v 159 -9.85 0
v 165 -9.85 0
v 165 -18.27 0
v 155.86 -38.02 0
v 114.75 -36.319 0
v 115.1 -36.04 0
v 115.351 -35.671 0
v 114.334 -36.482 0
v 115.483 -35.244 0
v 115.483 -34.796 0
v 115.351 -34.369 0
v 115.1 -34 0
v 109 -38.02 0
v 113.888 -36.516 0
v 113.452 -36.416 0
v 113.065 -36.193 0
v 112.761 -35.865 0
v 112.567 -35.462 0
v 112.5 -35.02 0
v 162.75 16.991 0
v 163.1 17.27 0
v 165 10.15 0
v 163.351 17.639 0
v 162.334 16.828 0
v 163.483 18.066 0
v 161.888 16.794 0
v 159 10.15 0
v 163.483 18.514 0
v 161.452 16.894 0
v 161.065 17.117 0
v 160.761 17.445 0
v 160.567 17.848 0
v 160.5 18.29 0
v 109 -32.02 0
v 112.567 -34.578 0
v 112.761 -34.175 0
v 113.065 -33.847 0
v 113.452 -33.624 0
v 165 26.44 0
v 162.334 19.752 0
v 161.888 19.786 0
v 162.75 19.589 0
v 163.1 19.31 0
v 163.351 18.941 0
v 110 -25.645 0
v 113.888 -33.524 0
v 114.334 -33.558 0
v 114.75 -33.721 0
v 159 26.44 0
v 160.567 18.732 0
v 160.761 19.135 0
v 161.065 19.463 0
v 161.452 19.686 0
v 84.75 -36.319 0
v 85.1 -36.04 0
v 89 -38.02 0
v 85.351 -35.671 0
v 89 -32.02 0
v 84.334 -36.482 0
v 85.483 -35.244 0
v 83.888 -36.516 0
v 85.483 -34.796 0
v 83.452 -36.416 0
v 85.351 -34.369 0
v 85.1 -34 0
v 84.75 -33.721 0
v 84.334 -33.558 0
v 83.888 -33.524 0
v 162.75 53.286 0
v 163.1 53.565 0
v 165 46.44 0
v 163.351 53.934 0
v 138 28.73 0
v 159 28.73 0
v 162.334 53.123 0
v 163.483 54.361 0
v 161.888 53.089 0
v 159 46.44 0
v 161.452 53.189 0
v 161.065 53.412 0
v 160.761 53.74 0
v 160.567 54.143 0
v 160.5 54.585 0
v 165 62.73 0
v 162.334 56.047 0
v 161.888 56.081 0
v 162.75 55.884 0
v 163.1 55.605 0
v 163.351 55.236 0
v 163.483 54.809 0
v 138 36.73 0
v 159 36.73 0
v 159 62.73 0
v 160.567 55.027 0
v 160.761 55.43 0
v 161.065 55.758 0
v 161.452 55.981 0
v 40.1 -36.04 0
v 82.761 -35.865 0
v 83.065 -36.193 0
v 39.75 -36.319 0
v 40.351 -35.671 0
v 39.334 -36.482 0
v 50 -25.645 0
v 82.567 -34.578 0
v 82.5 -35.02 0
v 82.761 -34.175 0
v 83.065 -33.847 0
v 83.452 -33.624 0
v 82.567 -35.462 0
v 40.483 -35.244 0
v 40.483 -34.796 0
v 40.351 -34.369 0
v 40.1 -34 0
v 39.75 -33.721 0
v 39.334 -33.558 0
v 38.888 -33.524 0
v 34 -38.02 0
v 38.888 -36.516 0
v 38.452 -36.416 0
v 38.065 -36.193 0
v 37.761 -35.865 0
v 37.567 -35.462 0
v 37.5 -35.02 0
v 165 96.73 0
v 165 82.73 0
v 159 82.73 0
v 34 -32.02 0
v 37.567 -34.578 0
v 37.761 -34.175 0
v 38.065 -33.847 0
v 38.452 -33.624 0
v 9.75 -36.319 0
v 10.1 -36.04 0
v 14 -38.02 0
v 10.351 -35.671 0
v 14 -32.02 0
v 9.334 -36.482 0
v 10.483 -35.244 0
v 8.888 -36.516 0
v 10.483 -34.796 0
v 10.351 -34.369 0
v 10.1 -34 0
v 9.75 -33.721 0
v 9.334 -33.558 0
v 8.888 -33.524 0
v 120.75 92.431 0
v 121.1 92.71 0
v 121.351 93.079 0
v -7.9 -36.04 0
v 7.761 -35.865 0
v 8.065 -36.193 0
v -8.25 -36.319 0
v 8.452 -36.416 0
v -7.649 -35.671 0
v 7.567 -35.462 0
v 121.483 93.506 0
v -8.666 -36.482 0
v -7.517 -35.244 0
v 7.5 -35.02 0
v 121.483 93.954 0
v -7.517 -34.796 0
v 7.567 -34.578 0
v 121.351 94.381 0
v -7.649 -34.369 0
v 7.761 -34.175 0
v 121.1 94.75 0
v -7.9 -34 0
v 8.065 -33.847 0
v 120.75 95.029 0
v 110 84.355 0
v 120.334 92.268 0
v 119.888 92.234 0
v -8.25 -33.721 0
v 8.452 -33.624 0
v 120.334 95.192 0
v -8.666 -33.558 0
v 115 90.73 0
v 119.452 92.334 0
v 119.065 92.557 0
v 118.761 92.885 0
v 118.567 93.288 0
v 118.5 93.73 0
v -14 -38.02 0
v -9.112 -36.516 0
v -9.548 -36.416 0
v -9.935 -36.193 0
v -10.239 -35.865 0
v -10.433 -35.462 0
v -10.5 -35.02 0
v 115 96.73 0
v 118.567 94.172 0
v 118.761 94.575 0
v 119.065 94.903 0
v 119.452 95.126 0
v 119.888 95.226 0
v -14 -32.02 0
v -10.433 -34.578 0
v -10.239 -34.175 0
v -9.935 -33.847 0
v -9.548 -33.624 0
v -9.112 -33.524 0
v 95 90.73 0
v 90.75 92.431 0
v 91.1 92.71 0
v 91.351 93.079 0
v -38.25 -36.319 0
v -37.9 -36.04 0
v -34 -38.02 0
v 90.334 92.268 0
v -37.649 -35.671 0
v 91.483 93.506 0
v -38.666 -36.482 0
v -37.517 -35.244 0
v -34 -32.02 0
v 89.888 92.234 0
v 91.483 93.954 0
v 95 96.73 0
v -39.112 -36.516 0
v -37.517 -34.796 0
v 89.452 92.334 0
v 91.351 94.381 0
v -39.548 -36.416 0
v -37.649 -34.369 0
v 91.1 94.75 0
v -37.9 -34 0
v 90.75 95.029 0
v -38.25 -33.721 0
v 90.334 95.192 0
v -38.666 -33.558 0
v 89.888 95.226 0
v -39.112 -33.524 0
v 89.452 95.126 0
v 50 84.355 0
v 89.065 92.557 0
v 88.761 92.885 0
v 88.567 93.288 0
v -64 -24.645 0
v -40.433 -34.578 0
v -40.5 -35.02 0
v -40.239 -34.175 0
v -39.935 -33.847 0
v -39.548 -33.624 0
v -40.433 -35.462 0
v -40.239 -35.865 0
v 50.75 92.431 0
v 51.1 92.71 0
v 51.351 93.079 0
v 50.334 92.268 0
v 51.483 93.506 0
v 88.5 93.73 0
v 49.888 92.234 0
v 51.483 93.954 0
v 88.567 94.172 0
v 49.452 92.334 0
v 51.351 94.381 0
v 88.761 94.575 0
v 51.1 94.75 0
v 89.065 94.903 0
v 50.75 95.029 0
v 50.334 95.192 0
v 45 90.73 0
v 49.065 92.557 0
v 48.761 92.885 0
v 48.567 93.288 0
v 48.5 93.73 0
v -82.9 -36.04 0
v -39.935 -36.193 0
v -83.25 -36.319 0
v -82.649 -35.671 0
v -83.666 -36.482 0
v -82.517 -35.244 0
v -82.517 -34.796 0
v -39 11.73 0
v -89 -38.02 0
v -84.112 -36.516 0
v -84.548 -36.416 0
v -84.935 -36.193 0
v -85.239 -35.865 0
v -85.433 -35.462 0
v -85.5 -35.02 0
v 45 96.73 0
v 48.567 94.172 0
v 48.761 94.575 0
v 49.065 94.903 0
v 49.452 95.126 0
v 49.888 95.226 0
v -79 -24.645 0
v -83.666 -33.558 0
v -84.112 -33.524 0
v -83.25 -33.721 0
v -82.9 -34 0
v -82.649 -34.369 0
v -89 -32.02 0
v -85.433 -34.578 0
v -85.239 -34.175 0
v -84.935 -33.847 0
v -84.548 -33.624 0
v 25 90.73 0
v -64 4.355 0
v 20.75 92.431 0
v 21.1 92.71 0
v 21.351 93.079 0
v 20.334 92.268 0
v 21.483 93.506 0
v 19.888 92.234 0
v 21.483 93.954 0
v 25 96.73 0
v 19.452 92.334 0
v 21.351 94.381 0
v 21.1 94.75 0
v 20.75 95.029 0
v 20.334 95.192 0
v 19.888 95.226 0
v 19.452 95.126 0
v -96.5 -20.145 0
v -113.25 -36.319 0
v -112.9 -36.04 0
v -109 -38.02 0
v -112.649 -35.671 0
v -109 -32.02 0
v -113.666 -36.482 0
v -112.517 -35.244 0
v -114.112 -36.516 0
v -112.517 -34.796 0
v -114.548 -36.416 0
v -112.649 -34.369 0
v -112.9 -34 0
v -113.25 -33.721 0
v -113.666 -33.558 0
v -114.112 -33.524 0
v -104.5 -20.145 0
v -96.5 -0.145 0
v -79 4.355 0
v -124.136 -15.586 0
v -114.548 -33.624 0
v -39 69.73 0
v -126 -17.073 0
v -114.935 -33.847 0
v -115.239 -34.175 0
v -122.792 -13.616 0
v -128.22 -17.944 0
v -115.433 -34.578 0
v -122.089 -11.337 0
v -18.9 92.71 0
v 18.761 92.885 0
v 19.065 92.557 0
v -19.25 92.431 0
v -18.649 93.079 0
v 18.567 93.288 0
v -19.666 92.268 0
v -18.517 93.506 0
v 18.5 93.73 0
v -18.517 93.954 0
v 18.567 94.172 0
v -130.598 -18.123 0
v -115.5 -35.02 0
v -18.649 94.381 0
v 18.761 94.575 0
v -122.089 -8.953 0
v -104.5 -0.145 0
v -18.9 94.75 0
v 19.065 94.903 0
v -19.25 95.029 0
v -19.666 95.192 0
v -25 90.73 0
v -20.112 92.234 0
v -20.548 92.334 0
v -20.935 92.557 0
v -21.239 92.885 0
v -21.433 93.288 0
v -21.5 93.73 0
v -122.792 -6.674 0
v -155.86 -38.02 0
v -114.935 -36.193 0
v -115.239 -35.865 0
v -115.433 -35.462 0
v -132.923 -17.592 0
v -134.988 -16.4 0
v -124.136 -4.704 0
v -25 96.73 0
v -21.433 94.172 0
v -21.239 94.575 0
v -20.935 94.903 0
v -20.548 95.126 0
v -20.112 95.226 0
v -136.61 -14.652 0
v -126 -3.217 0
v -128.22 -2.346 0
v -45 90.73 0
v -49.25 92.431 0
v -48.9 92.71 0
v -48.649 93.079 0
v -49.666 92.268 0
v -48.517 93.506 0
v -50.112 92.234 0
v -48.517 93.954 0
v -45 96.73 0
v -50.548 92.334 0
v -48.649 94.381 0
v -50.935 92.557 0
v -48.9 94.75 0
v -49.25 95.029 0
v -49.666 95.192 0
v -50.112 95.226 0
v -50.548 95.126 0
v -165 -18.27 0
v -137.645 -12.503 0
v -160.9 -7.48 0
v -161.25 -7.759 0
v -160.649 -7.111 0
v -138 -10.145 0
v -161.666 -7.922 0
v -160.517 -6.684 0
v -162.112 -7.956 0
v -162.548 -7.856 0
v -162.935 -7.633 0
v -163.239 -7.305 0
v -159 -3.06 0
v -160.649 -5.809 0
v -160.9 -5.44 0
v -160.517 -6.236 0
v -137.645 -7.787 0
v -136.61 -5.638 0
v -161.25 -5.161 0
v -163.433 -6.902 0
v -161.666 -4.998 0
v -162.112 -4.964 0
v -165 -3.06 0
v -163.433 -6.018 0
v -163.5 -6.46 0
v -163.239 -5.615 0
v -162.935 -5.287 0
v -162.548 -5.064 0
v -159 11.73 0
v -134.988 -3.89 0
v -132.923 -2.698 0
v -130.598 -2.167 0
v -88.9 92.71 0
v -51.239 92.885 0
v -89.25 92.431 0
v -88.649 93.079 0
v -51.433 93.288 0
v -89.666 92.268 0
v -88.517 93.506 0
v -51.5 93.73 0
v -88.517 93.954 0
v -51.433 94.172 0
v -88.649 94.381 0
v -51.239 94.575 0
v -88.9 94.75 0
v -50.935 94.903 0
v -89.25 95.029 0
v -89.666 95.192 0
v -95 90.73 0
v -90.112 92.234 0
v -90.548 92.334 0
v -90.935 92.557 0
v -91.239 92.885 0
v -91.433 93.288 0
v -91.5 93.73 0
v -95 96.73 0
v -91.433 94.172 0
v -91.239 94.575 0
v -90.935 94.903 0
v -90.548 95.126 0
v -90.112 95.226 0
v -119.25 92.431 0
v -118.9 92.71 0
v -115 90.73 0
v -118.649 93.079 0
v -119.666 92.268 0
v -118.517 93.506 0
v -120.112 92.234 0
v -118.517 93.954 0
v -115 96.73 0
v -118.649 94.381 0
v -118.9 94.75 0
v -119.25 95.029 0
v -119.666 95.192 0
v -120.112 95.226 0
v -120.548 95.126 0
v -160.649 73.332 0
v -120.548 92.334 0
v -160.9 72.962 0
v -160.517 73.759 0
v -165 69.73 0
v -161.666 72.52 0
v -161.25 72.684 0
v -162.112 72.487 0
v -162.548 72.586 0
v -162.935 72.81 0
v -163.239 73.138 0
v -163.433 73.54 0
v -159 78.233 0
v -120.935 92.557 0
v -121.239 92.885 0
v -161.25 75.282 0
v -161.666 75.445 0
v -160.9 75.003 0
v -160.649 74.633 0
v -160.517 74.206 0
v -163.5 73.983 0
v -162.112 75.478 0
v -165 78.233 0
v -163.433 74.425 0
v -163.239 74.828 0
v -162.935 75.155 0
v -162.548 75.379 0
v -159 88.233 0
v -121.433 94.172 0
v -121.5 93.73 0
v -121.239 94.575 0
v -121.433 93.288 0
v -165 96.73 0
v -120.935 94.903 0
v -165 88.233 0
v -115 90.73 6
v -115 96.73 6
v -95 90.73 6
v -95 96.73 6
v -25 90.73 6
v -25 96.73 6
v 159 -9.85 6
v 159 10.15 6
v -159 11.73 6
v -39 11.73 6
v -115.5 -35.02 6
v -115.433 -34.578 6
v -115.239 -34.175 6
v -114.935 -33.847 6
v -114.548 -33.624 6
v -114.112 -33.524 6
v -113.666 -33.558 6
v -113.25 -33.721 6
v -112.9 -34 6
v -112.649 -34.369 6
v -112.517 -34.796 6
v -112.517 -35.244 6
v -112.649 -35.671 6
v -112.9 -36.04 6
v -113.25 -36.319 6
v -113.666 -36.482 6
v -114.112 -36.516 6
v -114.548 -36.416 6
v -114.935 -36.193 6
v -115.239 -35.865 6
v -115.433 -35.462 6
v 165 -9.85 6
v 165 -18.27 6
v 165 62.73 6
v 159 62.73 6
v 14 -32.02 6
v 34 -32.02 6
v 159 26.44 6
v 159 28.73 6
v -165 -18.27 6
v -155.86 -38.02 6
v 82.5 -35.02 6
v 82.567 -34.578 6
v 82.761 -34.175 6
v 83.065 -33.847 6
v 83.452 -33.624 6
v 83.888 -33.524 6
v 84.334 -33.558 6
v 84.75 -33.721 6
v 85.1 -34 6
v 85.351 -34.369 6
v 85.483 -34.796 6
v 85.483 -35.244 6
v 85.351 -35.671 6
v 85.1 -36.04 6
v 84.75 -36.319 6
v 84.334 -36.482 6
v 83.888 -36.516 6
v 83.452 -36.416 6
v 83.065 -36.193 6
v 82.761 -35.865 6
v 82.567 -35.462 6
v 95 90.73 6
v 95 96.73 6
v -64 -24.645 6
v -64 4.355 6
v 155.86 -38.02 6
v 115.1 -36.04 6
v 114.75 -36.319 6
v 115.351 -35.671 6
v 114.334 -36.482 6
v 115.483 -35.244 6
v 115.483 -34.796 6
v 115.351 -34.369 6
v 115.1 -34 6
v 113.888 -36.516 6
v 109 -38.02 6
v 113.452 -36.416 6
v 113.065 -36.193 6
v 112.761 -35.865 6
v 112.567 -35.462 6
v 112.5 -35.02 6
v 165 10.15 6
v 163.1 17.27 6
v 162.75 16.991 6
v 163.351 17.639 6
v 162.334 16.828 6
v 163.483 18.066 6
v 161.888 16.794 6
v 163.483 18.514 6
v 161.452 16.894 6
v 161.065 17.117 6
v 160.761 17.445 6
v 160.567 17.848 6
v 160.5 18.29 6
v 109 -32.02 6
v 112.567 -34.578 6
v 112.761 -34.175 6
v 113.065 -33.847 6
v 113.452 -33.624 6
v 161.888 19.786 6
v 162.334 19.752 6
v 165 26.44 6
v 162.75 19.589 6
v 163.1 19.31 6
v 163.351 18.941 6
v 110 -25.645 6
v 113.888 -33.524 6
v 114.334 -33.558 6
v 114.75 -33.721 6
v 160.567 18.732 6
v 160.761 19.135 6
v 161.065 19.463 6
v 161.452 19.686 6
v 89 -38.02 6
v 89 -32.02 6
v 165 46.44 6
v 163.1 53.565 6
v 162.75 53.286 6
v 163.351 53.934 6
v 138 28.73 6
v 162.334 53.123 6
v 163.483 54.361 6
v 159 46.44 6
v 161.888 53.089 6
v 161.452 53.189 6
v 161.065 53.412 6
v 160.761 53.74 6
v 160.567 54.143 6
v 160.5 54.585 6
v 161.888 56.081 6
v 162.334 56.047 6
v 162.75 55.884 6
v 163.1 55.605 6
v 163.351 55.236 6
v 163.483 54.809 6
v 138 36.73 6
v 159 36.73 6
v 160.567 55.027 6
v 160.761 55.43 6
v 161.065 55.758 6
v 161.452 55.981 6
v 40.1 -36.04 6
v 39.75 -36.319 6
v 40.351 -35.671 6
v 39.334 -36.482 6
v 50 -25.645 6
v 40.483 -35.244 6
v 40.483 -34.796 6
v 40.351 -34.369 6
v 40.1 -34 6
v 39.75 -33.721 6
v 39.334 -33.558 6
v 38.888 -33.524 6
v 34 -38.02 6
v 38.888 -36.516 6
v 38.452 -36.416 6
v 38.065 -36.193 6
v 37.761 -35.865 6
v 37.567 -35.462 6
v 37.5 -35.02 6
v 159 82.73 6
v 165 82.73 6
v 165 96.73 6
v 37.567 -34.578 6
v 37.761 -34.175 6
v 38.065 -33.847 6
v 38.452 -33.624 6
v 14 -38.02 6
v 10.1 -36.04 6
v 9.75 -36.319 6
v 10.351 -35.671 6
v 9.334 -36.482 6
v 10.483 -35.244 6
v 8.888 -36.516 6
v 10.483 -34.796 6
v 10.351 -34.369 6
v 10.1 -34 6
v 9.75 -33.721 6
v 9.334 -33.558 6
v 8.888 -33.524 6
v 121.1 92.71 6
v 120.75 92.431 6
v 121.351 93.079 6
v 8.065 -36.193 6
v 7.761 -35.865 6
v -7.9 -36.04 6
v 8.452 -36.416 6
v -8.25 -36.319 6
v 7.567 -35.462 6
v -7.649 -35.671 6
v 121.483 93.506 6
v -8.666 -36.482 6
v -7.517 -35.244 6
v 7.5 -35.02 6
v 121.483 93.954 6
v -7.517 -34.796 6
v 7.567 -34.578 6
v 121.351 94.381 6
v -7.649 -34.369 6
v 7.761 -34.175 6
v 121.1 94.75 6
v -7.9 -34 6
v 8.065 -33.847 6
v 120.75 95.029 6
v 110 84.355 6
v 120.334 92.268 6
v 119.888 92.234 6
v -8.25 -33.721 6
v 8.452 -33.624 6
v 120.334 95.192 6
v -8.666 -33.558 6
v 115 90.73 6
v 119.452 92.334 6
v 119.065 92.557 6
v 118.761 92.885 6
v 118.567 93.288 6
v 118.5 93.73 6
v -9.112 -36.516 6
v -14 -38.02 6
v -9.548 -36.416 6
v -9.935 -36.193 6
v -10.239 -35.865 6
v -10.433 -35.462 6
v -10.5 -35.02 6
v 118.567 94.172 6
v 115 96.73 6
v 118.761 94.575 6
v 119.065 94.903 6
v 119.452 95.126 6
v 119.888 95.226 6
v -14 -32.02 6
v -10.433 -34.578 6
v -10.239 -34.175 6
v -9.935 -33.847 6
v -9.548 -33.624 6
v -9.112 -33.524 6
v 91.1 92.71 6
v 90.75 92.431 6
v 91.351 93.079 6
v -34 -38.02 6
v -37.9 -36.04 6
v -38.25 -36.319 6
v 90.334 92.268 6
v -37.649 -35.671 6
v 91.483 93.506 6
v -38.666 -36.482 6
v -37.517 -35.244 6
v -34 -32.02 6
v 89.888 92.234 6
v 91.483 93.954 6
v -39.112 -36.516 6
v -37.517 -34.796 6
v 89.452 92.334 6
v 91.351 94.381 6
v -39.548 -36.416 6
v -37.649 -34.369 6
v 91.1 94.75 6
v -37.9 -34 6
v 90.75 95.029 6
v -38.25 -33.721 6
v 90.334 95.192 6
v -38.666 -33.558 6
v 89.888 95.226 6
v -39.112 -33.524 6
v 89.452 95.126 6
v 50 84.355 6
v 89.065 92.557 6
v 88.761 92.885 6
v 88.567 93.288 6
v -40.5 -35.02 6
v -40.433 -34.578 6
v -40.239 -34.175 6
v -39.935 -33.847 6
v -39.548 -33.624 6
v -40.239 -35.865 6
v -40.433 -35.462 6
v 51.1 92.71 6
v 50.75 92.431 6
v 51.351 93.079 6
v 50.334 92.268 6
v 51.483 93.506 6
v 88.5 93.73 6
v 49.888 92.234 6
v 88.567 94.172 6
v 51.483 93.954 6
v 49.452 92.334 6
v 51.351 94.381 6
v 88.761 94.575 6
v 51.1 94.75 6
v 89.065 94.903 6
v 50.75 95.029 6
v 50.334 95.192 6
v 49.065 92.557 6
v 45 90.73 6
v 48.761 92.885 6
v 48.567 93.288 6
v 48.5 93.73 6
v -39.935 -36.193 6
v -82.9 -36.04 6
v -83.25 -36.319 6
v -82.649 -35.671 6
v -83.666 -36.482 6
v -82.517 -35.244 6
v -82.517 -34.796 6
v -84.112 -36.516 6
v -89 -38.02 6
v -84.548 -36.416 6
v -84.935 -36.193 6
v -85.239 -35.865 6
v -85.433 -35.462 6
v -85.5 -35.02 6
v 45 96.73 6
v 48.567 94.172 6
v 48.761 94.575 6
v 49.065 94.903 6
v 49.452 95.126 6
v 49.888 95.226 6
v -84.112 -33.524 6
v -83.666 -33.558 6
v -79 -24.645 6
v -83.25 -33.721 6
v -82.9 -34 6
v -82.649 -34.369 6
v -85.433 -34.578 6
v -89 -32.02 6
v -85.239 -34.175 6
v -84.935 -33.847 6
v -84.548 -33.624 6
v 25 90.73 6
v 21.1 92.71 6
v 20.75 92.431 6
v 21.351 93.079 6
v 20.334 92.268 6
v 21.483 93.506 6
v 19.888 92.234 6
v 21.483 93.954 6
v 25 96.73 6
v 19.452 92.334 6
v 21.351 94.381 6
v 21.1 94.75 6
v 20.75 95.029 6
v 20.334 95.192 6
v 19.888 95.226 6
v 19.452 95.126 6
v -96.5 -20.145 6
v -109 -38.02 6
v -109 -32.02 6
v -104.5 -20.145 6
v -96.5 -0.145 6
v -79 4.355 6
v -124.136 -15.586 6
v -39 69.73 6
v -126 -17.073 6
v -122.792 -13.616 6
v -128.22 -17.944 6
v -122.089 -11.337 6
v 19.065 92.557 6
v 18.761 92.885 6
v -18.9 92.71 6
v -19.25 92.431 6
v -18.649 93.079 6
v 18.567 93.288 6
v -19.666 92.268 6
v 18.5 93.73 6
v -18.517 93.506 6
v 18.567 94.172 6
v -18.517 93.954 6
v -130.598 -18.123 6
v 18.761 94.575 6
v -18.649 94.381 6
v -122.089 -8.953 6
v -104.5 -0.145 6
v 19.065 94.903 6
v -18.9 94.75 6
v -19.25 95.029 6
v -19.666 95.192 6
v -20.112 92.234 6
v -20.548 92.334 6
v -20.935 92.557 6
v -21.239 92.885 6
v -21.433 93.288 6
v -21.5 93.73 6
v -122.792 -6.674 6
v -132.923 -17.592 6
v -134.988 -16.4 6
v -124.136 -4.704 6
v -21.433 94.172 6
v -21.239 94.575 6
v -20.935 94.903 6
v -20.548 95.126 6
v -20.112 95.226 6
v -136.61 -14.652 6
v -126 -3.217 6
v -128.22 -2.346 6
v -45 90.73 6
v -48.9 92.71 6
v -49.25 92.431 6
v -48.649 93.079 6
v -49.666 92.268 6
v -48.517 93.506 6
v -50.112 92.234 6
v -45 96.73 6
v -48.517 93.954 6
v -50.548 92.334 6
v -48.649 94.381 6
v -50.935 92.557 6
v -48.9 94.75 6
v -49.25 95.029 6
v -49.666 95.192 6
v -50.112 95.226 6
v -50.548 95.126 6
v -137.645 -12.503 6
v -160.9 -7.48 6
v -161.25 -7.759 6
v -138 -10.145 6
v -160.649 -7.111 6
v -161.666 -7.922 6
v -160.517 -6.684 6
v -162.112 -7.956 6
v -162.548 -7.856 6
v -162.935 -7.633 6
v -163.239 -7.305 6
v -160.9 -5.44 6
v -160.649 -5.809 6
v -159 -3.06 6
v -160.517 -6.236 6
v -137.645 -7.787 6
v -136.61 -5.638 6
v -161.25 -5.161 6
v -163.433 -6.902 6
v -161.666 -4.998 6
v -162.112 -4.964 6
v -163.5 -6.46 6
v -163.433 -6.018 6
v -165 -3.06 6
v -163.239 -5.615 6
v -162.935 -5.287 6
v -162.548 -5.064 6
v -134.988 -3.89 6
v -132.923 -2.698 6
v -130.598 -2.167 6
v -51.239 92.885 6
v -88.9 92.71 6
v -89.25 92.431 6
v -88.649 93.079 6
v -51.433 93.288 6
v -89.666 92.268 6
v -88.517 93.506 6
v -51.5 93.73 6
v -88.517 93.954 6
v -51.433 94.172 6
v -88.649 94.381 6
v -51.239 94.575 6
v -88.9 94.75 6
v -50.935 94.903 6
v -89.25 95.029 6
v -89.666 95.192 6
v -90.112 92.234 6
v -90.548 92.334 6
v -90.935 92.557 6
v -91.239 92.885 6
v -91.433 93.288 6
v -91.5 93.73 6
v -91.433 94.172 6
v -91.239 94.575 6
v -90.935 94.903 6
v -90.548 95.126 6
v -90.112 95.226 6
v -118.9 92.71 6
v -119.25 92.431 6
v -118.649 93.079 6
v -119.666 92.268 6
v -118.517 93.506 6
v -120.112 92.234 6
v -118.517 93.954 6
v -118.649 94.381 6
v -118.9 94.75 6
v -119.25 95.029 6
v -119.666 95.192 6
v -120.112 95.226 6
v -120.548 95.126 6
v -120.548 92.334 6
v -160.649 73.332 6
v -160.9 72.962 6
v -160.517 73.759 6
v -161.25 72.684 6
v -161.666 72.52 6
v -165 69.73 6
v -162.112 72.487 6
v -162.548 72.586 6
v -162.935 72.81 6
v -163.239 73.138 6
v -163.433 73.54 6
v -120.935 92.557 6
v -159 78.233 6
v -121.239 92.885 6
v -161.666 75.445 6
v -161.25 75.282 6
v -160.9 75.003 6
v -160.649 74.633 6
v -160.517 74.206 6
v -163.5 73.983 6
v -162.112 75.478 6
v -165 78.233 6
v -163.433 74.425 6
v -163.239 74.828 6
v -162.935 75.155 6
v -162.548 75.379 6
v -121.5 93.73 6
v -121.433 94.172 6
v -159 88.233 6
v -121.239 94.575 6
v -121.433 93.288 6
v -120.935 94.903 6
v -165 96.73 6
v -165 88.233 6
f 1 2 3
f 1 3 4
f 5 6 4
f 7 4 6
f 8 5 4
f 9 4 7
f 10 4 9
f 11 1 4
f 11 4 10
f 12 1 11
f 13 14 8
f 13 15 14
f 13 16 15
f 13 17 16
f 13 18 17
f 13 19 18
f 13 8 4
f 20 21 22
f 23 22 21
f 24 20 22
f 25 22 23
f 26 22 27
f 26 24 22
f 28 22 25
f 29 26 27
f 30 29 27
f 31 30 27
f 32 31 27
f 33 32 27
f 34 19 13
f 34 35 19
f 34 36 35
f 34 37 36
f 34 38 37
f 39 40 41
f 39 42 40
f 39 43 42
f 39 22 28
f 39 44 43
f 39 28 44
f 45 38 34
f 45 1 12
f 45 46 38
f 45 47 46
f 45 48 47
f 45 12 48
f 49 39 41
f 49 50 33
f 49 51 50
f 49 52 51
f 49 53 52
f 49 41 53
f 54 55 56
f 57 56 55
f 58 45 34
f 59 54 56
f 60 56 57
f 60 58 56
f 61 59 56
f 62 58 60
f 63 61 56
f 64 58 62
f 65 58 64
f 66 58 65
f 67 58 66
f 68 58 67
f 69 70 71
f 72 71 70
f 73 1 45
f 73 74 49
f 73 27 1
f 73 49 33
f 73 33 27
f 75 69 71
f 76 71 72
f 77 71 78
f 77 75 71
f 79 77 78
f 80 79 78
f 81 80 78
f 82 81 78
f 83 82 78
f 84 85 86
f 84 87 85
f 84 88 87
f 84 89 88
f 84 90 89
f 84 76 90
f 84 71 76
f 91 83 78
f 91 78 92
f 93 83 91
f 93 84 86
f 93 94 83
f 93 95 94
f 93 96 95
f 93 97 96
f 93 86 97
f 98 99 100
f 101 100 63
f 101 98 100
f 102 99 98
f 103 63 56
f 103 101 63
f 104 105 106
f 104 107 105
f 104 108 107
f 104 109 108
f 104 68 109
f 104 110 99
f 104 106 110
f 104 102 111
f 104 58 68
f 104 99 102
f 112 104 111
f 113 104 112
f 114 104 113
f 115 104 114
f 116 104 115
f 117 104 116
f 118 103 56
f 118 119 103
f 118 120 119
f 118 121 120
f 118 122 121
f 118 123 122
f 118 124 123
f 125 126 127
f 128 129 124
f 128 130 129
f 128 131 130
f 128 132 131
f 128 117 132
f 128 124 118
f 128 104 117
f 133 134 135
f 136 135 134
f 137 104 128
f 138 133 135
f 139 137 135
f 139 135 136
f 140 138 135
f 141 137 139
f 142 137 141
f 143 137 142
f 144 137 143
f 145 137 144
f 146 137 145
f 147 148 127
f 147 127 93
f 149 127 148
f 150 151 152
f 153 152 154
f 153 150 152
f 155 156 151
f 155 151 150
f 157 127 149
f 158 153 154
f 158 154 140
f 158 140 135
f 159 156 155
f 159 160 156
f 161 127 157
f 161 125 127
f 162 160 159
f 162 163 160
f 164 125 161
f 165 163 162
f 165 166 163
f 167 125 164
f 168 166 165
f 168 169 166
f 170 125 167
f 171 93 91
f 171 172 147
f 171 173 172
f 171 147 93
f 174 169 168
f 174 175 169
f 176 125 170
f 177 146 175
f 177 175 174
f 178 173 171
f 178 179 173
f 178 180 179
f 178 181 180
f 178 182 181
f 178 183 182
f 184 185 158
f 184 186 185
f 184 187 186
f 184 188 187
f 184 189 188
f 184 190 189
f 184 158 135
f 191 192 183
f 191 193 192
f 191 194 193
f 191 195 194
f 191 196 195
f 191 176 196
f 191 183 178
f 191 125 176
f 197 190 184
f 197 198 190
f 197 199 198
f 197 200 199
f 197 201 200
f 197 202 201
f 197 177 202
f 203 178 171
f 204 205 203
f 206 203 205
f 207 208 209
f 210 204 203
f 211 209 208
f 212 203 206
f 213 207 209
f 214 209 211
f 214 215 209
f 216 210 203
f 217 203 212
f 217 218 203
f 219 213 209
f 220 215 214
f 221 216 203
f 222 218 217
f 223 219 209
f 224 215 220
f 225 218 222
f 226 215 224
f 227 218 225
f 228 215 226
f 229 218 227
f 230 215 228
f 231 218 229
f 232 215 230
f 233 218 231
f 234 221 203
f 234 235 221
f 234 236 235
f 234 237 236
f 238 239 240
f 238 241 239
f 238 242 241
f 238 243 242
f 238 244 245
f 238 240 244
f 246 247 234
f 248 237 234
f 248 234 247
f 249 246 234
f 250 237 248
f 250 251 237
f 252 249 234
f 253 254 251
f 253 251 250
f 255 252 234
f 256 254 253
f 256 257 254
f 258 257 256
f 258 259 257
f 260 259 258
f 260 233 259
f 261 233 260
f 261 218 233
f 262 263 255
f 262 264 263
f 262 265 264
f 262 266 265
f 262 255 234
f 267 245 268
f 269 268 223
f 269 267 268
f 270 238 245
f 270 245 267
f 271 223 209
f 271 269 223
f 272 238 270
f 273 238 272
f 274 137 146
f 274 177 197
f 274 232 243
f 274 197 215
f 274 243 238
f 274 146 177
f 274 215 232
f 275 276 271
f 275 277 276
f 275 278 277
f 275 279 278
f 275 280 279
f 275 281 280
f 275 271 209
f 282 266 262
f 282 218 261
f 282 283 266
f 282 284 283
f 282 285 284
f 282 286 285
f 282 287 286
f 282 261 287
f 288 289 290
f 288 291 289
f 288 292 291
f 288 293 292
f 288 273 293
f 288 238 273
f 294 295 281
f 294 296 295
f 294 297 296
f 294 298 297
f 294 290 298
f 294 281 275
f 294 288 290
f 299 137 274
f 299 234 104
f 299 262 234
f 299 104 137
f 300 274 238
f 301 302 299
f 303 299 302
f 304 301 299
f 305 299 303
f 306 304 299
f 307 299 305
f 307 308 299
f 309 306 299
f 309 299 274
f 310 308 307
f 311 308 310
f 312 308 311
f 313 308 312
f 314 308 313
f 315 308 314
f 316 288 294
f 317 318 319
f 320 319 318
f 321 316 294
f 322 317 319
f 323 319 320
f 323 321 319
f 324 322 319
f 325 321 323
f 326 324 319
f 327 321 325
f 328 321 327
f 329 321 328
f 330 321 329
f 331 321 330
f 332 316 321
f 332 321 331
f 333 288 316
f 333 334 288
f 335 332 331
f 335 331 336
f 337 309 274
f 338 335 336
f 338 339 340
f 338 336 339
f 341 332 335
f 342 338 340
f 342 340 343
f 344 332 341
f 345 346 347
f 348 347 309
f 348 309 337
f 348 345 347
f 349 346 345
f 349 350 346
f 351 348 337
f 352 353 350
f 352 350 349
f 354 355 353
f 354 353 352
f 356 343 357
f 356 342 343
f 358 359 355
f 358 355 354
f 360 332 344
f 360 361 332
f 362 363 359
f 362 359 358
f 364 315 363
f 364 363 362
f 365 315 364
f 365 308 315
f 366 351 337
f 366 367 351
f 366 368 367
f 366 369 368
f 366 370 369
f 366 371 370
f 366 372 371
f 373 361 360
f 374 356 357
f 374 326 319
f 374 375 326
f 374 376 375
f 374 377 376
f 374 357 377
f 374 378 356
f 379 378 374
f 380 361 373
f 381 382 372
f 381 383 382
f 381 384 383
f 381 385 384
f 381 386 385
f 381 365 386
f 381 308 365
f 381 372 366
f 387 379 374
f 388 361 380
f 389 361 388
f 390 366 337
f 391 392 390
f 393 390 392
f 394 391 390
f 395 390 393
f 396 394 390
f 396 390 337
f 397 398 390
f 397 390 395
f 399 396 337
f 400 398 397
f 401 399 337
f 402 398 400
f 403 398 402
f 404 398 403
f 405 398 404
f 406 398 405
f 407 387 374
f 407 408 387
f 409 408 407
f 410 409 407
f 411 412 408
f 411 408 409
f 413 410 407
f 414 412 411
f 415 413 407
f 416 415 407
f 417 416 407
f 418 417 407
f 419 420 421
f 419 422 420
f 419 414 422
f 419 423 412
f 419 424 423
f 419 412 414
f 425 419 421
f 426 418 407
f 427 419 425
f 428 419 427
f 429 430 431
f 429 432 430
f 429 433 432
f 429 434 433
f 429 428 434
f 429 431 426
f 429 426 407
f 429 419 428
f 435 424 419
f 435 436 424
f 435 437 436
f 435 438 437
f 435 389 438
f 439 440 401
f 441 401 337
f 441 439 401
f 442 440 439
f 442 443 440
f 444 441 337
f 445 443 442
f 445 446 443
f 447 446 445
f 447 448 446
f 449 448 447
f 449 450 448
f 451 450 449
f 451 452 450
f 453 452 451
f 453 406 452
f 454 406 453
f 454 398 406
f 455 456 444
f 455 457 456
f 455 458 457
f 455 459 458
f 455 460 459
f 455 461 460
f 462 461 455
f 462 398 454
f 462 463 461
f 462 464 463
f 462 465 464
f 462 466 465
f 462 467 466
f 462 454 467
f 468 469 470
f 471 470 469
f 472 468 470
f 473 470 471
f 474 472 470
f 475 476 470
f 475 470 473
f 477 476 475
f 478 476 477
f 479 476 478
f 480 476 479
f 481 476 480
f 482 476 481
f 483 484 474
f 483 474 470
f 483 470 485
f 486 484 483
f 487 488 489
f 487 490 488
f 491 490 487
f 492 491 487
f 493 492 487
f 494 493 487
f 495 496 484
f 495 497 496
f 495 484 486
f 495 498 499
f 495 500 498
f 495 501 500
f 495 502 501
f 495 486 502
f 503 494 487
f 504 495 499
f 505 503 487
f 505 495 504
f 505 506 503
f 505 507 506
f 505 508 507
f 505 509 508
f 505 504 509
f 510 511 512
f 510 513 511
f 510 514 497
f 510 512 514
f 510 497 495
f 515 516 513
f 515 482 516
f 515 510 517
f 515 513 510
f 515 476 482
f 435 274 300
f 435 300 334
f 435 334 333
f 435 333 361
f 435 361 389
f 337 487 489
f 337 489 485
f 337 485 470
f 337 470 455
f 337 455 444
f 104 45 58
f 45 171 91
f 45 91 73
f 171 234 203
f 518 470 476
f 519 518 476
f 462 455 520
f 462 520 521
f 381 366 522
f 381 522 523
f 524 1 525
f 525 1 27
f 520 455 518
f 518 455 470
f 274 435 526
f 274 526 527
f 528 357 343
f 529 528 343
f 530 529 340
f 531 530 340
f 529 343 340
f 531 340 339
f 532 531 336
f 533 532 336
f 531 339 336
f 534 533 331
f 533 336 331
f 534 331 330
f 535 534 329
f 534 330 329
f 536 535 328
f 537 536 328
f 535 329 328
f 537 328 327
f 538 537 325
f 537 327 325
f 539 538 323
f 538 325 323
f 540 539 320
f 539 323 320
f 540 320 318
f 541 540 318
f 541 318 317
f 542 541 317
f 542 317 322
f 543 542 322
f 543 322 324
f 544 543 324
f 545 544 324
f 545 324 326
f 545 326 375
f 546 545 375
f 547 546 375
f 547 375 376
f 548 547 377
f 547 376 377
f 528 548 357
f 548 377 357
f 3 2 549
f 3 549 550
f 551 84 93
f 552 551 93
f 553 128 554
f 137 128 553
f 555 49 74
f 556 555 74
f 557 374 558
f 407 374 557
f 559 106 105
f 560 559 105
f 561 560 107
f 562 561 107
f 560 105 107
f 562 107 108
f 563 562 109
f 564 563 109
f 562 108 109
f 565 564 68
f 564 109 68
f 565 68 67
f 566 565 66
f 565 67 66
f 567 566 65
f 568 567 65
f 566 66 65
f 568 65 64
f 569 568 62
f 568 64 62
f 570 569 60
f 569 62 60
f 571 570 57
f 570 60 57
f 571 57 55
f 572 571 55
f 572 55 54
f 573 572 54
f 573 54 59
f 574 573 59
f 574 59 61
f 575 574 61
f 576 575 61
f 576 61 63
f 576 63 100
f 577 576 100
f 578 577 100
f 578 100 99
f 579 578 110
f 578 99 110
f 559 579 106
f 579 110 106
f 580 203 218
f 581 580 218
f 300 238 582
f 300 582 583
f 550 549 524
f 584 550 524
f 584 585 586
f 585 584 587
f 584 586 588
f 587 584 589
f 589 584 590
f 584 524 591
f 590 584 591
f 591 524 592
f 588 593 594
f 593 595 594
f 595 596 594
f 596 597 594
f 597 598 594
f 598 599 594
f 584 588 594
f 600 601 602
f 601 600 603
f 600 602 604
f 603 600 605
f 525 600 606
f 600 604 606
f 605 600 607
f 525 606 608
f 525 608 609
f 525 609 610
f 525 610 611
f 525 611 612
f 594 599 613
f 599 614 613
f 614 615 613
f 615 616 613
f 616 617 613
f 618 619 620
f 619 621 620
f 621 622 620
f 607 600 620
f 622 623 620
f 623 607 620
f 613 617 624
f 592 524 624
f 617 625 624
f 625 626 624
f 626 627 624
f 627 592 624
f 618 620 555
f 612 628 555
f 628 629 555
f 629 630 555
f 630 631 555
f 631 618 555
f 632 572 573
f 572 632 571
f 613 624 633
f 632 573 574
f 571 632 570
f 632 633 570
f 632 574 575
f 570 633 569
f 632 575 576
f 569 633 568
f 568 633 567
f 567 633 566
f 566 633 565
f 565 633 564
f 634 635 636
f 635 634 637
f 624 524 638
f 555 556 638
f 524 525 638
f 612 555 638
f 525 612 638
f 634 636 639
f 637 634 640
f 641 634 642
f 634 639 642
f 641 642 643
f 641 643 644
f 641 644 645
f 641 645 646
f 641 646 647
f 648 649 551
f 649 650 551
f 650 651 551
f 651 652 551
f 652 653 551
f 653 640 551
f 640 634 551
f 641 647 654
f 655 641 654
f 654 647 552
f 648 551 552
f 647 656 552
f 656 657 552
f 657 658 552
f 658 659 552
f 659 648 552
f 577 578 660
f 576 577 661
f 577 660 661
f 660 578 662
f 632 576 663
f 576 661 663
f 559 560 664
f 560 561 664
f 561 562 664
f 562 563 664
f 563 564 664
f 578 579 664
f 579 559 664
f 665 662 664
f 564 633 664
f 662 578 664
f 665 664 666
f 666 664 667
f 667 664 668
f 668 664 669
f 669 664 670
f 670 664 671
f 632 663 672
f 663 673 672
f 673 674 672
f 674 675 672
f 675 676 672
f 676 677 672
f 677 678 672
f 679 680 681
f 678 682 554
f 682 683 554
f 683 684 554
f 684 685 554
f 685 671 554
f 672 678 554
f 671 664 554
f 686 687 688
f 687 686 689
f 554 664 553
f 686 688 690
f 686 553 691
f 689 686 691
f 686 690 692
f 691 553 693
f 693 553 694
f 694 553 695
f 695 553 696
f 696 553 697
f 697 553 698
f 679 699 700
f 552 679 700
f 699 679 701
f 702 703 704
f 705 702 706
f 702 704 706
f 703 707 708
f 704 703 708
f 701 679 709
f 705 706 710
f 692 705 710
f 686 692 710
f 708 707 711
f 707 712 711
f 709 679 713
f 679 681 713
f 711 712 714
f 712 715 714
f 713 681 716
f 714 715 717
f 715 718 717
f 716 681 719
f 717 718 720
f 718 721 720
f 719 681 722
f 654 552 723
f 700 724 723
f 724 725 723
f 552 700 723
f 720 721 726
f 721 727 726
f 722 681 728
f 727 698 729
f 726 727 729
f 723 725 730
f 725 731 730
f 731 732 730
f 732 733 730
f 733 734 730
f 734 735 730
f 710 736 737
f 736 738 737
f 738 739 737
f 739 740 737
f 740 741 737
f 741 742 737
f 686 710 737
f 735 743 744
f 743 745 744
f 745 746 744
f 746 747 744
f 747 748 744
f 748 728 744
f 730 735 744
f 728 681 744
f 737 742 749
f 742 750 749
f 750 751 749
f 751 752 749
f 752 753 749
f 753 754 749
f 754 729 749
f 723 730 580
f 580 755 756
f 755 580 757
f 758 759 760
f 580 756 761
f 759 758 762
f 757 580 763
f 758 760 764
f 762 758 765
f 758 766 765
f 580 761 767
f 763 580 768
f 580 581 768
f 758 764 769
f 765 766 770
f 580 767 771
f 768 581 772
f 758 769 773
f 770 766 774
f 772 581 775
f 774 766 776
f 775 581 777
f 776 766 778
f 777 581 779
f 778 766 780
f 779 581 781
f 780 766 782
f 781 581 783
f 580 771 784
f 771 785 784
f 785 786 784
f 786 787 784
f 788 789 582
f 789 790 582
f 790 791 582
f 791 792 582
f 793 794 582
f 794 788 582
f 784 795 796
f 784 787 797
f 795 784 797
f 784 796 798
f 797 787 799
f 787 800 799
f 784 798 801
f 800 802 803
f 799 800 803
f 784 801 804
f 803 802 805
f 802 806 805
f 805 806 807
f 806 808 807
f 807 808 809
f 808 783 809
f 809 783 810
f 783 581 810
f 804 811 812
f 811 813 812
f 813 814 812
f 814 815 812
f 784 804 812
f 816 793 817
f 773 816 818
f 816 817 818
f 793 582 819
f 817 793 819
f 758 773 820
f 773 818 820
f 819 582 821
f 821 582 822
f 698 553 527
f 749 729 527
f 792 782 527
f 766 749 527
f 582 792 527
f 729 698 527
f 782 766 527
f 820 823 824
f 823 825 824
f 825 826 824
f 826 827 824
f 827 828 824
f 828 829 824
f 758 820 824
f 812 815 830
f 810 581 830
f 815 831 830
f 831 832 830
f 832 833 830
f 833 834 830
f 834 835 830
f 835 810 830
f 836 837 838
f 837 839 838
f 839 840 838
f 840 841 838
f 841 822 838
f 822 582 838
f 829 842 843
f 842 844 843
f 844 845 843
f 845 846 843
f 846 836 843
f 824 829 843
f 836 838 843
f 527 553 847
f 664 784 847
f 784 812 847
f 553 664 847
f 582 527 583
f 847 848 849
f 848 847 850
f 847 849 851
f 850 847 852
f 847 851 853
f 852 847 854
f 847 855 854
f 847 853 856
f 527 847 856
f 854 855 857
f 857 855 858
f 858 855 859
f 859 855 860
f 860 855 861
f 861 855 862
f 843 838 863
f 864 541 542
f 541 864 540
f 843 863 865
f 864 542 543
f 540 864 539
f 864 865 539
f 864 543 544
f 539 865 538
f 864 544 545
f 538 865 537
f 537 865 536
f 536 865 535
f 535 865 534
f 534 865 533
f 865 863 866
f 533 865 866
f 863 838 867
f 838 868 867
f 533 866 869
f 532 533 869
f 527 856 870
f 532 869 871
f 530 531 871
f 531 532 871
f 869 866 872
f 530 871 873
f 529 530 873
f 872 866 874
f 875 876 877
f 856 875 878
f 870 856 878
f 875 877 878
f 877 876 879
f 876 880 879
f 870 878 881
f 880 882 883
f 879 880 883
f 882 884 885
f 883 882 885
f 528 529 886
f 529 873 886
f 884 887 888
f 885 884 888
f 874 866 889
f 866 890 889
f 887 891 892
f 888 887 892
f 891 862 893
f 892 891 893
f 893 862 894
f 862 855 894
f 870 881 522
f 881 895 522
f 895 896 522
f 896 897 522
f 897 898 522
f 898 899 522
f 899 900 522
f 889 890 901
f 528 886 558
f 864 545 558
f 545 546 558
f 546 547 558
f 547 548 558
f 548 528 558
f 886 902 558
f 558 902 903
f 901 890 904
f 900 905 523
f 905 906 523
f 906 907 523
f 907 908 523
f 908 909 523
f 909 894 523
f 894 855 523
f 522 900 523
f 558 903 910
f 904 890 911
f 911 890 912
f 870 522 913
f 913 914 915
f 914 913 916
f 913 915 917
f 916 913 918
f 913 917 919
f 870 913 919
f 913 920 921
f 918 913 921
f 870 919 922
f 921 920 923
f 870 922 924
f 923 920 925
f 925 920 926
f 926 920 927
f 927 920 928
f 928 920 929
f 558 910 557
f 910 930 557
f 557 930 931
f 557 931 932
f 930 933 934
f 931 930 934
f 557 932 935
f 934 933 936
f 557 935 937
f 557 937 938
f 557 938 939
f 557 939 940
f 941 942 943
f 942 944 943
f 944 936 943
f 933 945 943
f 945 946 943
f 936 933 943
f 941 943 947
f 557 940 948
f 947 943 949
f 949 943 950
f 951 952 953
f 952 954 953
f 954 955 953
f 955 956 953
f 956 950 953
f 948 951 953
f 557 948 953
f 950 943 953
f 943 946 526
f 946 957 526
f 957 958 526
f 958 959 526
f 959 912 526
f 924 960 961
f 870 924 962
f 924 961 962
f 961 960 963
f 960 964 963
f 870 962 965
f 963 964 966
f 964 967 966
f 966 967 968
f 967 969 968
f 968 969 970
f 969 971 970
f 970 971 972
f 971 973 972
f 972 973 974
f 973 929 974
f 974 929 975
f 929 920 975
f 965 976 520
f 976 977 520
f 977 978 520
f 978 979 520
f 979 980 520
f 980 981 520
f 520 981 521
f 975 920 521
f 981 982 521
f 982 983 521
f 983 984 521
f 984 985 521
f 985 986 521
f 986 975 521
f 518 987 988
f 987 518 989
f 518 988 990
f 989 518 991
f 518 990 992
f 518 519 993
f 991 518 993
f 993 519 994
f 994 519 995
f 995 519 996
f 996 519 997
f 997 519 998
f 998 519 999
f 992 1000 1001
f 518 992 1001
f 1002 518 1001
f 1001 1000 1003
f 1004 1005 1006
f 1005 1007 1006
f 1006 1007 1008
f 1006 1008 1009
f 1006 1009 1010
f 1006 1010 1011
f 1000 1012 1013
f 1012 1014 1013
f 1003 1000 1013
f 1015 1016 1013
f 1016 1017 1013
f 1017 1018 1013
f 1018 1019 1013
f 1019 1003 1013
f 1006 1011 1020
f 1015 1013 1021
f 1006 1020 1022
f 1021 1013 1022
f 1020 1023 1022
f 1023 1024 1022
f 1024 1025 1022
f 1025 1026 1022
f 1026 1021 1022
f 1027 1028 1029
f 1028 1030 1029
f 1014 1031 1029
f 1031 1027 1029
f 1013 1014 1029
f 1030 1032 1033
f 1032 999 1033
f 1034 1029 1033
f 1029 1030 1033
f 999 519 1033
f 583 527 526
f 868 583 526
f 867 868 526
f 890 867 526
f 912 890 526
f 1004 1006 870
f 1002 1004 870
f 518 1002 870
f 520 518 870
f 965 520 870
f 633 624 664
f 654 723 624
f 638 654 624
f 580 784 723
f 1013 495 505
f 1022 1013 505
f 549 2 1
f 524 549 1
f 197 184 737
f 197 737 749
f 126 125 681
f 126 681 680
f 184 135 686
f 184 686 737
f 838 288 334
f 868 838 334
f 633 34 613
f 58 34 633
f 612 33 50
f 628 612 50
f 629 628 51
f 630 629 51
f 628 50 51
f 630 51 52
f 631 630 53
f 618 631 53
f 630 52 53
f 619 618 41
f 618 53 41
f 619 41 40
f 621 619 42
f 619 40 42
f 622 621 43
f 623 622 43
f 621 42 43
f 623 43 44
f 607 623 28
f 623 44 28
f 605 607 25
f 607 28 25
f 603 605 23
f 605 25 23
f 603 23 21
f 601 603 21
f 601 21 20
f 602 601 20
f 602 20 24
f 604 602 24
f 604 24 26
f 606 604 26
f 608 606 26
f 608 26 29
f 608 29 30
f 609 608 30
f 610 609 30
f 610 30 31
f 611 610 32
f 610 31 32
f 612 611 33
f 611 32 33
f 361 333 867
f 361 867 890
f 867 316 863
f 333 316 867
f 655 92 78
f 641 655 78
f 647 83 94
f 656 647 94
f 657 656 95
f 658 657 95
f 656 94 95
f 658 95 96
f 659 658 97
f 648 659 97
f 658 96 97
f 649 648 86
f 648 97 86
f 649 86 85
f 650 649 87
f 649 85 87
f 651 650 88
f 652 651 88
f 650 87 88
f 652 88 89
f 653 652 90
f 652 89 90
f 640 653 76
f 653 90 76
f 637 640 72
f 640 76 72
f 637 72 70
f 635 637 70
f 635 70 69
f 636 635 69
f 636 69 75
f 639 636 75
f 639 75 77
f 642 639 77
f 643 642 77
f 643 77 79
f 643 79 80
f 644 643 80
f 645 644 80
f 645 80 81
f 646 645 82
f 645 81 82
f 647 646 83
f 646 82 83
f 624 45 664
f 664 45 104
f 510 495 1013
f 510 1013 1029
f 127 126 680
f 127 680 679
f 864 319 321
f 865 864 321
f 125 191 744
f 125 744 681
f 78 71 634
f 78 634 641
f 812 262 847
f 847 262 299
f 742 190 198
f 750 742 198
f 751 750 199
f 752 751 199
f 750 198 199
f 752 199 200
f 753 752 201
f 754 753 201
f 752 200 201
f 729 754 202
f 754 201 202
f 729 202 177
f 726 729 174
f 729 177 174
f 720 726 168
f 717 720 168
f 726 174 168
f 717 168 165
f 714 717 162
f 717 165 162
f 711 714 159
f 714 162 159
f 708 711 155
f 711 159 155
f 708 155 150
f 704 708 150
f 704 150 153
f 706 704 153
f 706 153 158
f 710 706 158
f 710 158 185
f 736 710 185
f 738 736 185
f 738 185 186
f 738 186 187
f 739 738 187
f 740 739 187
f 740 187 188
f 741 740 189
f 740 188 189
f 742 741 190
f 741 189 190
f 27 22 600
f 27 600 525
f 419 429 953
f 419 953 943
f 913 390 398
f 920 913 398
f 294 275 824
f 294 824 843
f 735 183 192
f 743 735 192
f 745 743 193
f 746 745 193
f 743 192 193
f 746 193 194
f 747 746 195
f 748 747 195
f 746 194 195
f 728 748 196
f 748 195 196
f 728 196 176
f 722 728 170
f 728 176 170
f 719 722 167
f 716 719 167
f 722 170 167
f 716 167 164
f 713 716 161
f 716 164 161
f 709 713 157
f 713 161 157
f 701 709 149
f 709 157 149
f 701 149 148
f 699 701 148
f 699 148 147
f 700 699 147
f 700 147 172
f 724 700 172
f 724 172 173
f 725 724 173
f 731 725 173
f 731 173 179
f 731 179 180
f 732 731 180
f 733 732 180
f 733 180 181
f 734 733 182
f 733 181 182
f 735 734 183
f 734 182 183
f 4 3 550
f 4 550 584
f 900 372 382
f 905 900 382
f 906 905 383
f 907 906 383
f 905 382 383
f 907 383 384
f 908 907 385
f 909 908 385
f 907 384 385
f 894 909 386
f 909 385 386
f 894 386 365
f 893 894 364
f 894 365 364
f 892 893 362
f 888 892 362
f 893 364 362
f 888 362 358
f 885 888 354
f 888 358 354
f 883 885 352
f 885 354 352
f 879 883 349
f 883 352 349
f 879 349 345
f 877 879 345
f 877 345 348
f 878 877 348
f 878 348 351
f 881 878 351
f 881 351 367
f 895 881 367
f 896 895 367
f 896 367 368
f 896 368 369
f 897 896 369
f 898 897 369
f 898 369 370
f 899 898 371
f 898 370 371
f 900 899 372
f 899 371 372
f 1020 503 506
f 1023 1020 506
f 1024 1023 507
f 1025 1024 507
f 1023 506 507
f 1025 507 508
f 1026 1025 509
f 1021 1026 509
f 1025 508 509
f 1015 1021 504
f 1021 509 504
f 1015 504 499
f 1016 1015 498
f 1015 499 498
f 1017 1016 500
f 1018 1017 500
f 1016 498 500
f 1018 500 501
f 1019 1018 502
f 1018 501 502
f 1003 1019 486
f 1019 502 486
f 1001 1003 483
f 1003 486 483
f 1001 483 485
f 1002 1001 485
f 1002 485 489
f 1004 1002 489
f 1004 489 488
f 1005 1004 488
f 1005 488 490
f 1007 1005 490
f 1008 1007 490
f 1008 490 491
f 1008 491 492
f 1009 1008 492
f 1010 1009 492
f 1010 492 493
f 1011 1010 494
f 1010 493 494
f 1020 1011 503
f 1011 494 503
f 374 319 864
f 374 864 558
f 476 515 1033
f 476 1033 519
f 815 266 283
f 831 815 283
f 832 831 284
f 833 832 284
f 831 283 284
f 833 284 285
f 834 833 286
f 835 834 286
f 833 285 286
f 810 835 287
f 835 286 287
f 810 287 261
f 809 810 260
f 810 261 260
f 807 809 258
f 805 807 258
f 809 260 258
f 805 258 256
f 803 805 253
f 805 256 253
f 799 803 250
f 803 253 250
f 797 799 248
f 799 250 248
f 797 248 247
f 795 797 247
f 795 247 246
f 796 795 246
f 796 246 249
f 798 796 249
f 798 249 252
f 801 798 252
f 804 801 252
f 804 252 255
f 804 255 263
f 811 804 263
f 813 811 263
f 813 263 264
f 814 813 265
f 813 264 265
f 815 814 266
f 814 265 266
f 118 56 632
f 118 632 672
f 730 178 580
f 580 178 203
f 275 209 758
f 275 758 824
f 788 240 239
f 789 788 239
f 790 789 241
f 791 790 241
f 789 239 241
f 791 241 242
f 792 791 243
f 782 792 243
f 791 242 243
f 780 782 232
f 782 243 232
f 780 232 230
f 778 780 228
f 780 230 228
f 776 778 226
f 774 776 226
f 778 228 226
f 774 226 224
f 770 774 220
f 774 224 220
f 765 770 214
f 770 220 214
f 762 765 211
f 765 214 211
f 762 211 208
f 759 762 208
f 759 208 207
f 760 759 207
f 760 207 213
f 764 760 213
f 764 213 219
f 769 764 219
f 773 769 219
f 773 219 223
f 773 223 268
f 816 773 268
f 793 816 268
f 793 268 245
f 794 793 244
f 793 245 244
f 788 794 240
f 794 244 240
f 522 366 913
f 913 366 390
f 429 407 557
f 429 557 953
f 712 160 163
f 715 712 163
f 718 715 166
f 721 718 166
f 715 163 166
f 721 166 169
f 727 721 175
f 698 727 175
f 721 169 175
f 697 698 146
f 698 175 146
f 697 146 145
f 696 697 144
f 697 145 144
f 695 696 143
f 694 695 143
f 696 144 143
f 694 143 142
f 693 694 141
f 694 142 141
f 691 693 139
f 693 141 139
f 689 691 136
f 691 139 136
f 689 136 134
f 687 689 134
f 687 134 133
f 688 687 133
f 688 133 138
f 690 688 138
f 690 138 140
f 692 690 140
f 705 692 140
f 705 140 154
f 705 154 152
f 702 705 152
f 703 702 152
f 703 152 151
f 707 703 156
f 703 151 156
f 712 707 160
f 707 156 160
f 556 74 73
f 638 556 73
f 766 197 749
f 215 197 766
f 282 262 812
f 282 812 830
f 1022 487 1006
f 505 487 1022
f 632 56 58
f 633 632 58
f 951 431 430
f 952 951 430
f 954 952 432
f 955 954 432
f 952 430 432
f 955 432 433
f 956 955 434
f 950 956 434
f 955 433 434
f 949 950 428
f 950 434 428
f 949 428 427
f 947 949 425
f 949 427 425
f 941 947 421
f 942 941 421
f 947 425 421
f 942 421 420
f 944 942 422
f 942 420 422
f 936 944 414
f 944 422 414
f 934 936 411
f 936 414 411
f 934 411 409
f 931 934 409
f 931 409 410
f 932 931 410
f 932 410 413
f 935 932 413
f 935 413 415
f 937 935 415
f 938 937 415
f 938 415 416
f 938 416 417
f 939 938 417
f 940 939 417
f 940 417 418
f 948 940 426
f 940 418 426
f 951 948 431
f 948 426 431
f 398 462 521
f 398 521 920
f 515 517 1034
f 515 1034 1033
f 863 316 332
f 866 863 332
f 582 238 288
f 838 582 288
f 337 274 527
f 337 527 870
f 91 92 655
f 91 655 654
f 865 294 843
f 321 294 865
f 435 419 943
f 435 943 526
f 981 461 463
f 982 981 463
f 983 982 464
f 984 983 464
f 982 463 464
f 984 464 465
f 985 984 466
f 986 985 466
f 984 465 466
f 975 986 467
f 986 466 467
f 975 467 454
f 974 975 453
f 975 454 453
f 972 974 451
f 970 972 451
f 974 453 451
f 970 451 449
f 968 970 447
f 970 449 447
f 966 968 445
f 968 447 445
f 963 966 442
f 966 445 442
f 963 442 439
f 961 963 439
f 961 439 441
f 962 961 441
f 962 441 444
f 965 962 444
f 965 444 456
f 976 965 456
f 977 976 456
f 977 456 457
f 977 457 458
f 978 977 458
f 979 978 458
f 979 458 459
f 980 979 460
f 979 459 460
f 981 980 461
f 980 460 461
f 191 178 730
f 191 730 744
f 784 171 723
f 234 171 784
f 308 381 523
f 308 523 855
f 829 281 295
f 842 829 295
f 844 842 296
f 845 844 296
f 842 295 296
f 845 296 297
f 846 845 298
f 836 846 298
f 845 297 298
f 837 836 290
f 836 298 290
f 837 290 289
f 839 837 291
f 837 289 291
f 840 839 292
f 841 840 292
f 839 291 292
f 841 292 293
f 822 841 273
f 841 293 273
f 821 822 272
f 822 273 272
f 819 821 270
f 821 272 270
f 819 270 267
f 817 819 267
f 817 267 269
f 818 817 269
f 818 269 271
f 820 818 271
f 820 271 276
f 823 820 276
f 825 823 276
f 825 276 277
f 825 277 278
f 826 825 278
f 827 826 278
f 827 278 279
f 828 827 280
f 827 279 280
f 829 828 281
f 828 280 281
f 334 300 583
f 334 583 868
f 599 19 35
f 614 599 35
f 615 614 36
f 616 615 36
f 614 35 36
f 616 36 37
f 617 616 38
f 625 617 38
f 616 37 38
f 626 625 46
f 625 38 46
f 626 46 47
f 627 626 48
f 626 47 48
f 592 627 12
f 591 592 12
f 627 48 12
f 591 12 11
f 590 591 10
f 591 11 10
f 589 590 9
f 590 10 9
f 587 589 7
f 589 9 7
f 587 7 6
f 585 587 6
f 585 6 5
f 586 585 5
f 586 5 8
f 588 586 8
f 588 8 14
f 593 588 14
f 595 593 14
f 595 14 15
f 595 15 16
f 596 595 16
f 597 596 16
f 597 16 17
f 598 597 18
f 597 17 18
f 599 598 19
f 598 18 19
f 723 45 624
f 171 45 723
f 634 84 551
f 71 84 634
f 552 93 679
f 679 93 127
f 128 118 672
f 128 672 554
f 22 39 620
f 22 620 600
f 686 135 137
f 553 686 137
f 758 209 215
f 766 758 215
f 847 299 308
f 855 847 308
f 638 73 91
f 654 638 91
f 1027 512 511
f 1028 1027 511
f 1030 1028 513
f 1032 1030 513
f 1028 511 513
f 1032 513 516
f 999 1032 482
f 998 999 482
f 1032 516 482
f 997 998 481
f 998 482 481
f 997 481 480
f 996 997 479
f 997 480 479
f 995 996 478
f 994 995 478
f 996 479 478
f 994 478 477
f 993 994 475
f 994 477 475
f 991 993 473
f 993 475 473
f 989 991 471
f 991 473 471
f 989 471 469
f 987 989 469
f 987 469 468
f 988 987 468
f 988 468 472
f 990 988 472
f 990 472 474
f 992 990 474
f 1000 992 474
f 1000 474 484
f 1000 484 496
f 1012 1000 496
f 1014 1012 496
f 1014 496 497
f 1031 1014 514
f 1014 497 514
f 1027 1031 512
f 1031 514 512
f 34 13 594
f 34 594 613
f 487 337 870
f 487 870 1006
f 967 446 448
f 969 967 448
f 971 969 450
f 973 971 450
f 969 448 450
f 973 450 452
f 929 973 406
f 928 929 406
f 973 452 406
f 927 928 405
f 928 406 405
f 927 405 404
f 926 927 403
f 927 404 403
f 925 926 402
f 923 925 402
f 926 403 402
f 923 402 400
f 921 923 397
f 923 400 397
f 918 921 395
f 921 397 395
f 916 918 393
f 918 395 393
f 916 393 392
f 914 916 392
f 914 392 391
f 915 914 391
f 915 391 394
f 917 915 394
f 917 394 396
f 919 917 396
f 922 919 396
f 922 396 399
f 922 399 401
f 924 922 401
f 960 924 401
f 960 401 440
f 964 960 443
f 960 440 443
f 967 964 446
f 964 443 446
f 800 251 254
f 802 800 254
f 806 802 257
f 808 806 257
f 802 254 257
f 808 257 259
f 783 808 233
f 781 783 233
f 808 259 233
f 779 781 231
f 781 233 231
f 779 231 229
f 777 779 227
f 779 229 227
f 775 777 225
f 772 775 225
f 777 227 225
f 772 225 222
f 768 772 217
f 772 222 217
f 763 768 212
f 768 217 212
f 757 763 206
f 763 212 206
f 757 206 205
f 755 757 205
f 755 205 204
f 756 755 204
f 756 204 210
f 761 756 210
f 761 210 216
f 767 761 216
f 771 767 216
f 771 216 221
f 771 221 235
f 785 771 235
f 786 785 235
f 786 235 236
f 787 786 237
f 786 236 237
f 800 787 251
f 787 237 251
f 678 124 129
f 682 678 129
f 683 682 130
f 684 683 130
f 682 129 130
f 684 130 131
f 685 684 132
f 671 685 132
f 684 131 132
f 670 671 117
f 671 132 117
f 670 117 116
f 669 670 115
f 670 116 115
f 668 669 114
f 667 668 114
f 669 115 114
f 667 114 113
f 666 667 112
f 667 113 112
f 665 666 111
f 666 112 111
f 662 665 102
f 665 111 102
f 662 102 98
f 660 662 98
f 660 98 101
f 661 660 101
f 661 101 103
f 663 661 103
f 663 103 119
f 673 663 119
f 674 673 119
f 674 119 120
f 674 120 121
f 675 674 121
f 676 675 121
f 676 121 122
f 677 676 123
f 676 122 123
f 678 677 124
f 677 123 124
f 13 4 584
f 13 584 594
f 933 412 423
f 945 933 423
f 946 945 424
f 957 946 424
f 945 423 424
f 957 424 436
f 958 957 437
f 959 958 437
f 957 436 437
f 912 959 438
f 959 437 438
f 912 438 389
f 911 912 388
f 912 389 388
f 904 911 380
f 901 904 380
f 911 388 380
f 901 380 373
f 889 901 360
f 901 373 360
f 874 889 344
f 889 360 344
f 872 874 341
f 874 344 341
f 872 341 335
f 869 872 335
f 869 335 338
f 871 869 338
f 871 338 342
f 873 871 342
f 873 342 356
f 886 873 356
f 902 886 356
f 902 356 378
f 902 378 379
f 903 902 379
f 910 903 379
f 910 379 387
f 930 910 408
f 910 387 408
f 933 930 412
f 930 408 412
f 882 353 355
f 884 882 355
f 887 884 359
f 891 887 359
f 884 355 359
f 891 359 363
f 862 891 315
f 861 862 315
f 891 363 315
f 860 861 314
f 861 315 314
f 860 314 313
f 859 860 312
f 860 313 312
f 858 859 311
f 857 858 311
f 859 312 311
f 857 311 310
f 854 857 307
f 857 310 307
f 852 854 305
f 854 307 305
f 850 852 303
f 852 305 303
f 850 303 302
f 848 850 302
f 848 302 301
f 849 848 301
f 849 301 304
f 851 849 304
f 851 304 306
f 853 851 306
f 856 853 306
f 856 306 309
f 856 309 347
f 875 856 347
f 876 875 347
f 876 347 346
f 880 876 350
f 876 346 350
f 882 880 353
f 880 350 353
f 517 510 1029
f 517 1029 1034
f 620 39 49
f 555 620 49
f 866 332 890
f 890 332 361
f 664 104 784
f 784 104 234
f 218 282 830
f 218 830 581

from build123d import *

# Parameters (mm, degrees)
BOSS_EXTRU_1_DEPTH      = 6
ESQUISSE3_R             = 8
ESQUISSE3_W             = 6
ESQUISSE3_H             = 10
ESQUISSE3_W_2           = 20
ESQUISSE3_H_2           = 6
ESQUISSE3_W_3           = 60
ESQUISSE3_H_3           = 110
ESQUISSE3_H_4           = 20
ESQUISSE3_W_4           = 8
ESQUISSE3_W_5           = 15
ESQUISSE3_H_5           = 29
ENL_V_MAT_EXTRU_2_DEPTH = 6
ESQUISSE4_R             = 1.5
ENL_V_MAT_EXTRU_3_DEPTH = 6
ESQUISSE5_W             = 456.045253014
ESQUISSE5_H             = 136.228984631
ENL_V_MAT_EXTRU_4_DEPTH = 6
ESQUISSE6_W             = 21
ESQUISSE6_H             = 8
ENL_V_MAT_EXTRU_5_DEPTH = 10


with BuildPart() as part:
    # Esquisse1 → Boss.-Extru.1 (new body)
    with BuildSketch(Plane.XY):
        Polygon((-165, 96.73), (165, 96.73), (165, -18.27), (123, -109.022410436), (-123, -109.022410436), (-165, -18.27), align=None)
    extrude(amount=BOSS_EXTRU_1_DEPTH)

    # Esquisse3 → Enlèv. mat.-Extru.2 (cut)
    with BuildSketch(Plane(origin=(0, 0, 0), x_dir=(-1, 0, 0), z_dir=(0, 0, -1))):
        with Locations((130, -10.145)):
            Circle(ESQUISSE3_R)
        Polygon((165, -3.06), (159, -3.06), (159, 11.73), (39, 11.73), (39, 69.73), (165, 69.73), align=None)
        with Locations((162, 83.23258956)):
            Rectangle(ESQUISSE3_W, ESQUISSE3_H)
        with Locations((-24, -35.02)):
            Rectangle(ESQUISSE3_W_2, ESQUISSE3_H_2)
        with Locations((99, -35.02)):
            Rectangle(ESQUISSE3_W_2, ESQUISSE3_H_2)
        with Locations((-80, 29.355)):
            Rectangle(ESQUISSE3_W_3, ESQUISSE3_H_3)
        with Locations((-162, 72.73)):
            Rectangle(ESQUISSE3_W, ESQUISSE3_H_4)
        with Locations((24, -35.02)):
            Rectangle(ESQUISSE3_W_2, ESQUISSE3_H_2)
        with Locations((-162, 36.44)):
            Rectangle(ESQUISSE3_W, ESQUISSE3_H_4)
        with Locations((-162, 0.15)):
            Rectangle(ESQUISSE3_W, ESQUISSE3_H_4)
        with Locations((105, 93.73)):
            Rectangle(ESQUISSE3_W_2, ESQUISSE3_H_2)
        with Locations((-35, 93.73)):
            Rectangle(ESQUISSE3_W_2, ESQUISSE3_H_2)
        with Locations((35, 93.73)):
            Rectangle(ESQUISSE3_W_2, ESQUISSE3_H_2)
        with Locations((-105, 93.73)):
            Rectangle(ESQUISSE3_W_2, ESQUISSE3_H_2)
        with Locations((100.5, -10.145)):
            Rectangle(ESQUISSE3_W_4, ESQUISSE3_H_4)
        with Locations((-99, -35.02)):
            Rectangle(ESQUISSE3_W_2, ESQUISSE3_H_2)
        with Locations((71.5, -10.145)):
            Rectangle(ESQUISSE3_W_5, ESQUISSE3_H_5)
    extrude(amount=-ENL_V_MAT_EXTRU_2_DEPTH, mode=Mode.SUBTRACT)

    # Esquisse4 → Enlèv. mat.-Extru.3 (cut)
    with BuildSketch(Plane(origin=(0, 0, 0), x_dir=(-1, 0, 0), z_dir=(0, 0, -1))):
        with Locations((114, -35.02)):
            Circle(ESQUISSE4_R)
        with Locations((162, 73.98258956)):
            Circle(ESQUISSE4_R)
        with Locations((84, -35.02)):
            Circle(ESQUISSE4_R)
        with Locations((39, -35.02)):
            Circle(ESQUISSE4_R)
        with Locations((162, -6.46)):
            Circle(ESQUISSE4_R)
        with Locations((9, -35.02)):
            Circle(ESQUISSE4_R)
        with Locations((-9, -35.02)):
            Circle(ESQUISSE4_R)
        with Locations((-39, -35.02)):
            Circle(ESQUISSE4_R)
        with Locations((-84, -35.02)):
            Circle(ESQUISSE4_R)
        with Locations((120, 93.73)):
            Circle(ESQUISSE4_R)
        with Locations((-114, -35.02)):
            Circle(ESQUISSE4_R)
        with Locations((90, 93.73)):
            Circle(ESQUISSE4_R)
        with Locations((50, 93.73)):
            Circle(ESQUISSE4_R)
        with Locations((20, 93.73)):
            Circle(ESQUISSE4_R)
        with Locations((-162, 18.29)):
            Circle(ESQUISSE4_R)
        with Locations((-162, 54.585)):
            Circle(ESQUISSE4_R)
        with Locations((-20, 93.73)):
            Circle(ESQUISSE4_R)
        with Locations((-50, 93.73)):
            Circle(ESQUISSE4_R)
        with Locations((-90, 93.73)):
            Circle(ESQUISSE4_R)
        with Locations((-120, 93.73)):
            Circle(ESQUISSE4_R)
    extrude(amount=-ENL_V_MAT_EXTRU_3_DEPTH, mode=Mode.SUBTRACT)

    # Esquisse5 → Enlèv. mat.-Extru.4 (cut)
    with BuildSketch(Plane(origin=(0, 0, 0), x_dir=(-1, 0, 0), z_dir=(0, 0, -1))):
        with Locations((-18.307092018, -106.134492316)):
            Rectangle(ESQUISSE5_W, ESQUISSE5_H)
    extrude(amount=-ENL_V_MAT_EXTRU_4_DEPTH, mode=Mode.SUBTRACT)

    # Esquisse6 → Enlèv. mat.-Extru.5 (cut)
    with BuildSketch(Plane(origin=(0, 0, 0), x_dir=(-1, 0, 0), z_dir=(0, 0, -1))):
        with Locations((-148.5, 32.73)):
            Rectangle(ESQUISSE6_W, ESQUISSE6_H)
    extrude(amount=-ENL_V_MAT_EXTRU_5_DEPTH, mode=Mode.SUBTRACT)


solid = part.part
